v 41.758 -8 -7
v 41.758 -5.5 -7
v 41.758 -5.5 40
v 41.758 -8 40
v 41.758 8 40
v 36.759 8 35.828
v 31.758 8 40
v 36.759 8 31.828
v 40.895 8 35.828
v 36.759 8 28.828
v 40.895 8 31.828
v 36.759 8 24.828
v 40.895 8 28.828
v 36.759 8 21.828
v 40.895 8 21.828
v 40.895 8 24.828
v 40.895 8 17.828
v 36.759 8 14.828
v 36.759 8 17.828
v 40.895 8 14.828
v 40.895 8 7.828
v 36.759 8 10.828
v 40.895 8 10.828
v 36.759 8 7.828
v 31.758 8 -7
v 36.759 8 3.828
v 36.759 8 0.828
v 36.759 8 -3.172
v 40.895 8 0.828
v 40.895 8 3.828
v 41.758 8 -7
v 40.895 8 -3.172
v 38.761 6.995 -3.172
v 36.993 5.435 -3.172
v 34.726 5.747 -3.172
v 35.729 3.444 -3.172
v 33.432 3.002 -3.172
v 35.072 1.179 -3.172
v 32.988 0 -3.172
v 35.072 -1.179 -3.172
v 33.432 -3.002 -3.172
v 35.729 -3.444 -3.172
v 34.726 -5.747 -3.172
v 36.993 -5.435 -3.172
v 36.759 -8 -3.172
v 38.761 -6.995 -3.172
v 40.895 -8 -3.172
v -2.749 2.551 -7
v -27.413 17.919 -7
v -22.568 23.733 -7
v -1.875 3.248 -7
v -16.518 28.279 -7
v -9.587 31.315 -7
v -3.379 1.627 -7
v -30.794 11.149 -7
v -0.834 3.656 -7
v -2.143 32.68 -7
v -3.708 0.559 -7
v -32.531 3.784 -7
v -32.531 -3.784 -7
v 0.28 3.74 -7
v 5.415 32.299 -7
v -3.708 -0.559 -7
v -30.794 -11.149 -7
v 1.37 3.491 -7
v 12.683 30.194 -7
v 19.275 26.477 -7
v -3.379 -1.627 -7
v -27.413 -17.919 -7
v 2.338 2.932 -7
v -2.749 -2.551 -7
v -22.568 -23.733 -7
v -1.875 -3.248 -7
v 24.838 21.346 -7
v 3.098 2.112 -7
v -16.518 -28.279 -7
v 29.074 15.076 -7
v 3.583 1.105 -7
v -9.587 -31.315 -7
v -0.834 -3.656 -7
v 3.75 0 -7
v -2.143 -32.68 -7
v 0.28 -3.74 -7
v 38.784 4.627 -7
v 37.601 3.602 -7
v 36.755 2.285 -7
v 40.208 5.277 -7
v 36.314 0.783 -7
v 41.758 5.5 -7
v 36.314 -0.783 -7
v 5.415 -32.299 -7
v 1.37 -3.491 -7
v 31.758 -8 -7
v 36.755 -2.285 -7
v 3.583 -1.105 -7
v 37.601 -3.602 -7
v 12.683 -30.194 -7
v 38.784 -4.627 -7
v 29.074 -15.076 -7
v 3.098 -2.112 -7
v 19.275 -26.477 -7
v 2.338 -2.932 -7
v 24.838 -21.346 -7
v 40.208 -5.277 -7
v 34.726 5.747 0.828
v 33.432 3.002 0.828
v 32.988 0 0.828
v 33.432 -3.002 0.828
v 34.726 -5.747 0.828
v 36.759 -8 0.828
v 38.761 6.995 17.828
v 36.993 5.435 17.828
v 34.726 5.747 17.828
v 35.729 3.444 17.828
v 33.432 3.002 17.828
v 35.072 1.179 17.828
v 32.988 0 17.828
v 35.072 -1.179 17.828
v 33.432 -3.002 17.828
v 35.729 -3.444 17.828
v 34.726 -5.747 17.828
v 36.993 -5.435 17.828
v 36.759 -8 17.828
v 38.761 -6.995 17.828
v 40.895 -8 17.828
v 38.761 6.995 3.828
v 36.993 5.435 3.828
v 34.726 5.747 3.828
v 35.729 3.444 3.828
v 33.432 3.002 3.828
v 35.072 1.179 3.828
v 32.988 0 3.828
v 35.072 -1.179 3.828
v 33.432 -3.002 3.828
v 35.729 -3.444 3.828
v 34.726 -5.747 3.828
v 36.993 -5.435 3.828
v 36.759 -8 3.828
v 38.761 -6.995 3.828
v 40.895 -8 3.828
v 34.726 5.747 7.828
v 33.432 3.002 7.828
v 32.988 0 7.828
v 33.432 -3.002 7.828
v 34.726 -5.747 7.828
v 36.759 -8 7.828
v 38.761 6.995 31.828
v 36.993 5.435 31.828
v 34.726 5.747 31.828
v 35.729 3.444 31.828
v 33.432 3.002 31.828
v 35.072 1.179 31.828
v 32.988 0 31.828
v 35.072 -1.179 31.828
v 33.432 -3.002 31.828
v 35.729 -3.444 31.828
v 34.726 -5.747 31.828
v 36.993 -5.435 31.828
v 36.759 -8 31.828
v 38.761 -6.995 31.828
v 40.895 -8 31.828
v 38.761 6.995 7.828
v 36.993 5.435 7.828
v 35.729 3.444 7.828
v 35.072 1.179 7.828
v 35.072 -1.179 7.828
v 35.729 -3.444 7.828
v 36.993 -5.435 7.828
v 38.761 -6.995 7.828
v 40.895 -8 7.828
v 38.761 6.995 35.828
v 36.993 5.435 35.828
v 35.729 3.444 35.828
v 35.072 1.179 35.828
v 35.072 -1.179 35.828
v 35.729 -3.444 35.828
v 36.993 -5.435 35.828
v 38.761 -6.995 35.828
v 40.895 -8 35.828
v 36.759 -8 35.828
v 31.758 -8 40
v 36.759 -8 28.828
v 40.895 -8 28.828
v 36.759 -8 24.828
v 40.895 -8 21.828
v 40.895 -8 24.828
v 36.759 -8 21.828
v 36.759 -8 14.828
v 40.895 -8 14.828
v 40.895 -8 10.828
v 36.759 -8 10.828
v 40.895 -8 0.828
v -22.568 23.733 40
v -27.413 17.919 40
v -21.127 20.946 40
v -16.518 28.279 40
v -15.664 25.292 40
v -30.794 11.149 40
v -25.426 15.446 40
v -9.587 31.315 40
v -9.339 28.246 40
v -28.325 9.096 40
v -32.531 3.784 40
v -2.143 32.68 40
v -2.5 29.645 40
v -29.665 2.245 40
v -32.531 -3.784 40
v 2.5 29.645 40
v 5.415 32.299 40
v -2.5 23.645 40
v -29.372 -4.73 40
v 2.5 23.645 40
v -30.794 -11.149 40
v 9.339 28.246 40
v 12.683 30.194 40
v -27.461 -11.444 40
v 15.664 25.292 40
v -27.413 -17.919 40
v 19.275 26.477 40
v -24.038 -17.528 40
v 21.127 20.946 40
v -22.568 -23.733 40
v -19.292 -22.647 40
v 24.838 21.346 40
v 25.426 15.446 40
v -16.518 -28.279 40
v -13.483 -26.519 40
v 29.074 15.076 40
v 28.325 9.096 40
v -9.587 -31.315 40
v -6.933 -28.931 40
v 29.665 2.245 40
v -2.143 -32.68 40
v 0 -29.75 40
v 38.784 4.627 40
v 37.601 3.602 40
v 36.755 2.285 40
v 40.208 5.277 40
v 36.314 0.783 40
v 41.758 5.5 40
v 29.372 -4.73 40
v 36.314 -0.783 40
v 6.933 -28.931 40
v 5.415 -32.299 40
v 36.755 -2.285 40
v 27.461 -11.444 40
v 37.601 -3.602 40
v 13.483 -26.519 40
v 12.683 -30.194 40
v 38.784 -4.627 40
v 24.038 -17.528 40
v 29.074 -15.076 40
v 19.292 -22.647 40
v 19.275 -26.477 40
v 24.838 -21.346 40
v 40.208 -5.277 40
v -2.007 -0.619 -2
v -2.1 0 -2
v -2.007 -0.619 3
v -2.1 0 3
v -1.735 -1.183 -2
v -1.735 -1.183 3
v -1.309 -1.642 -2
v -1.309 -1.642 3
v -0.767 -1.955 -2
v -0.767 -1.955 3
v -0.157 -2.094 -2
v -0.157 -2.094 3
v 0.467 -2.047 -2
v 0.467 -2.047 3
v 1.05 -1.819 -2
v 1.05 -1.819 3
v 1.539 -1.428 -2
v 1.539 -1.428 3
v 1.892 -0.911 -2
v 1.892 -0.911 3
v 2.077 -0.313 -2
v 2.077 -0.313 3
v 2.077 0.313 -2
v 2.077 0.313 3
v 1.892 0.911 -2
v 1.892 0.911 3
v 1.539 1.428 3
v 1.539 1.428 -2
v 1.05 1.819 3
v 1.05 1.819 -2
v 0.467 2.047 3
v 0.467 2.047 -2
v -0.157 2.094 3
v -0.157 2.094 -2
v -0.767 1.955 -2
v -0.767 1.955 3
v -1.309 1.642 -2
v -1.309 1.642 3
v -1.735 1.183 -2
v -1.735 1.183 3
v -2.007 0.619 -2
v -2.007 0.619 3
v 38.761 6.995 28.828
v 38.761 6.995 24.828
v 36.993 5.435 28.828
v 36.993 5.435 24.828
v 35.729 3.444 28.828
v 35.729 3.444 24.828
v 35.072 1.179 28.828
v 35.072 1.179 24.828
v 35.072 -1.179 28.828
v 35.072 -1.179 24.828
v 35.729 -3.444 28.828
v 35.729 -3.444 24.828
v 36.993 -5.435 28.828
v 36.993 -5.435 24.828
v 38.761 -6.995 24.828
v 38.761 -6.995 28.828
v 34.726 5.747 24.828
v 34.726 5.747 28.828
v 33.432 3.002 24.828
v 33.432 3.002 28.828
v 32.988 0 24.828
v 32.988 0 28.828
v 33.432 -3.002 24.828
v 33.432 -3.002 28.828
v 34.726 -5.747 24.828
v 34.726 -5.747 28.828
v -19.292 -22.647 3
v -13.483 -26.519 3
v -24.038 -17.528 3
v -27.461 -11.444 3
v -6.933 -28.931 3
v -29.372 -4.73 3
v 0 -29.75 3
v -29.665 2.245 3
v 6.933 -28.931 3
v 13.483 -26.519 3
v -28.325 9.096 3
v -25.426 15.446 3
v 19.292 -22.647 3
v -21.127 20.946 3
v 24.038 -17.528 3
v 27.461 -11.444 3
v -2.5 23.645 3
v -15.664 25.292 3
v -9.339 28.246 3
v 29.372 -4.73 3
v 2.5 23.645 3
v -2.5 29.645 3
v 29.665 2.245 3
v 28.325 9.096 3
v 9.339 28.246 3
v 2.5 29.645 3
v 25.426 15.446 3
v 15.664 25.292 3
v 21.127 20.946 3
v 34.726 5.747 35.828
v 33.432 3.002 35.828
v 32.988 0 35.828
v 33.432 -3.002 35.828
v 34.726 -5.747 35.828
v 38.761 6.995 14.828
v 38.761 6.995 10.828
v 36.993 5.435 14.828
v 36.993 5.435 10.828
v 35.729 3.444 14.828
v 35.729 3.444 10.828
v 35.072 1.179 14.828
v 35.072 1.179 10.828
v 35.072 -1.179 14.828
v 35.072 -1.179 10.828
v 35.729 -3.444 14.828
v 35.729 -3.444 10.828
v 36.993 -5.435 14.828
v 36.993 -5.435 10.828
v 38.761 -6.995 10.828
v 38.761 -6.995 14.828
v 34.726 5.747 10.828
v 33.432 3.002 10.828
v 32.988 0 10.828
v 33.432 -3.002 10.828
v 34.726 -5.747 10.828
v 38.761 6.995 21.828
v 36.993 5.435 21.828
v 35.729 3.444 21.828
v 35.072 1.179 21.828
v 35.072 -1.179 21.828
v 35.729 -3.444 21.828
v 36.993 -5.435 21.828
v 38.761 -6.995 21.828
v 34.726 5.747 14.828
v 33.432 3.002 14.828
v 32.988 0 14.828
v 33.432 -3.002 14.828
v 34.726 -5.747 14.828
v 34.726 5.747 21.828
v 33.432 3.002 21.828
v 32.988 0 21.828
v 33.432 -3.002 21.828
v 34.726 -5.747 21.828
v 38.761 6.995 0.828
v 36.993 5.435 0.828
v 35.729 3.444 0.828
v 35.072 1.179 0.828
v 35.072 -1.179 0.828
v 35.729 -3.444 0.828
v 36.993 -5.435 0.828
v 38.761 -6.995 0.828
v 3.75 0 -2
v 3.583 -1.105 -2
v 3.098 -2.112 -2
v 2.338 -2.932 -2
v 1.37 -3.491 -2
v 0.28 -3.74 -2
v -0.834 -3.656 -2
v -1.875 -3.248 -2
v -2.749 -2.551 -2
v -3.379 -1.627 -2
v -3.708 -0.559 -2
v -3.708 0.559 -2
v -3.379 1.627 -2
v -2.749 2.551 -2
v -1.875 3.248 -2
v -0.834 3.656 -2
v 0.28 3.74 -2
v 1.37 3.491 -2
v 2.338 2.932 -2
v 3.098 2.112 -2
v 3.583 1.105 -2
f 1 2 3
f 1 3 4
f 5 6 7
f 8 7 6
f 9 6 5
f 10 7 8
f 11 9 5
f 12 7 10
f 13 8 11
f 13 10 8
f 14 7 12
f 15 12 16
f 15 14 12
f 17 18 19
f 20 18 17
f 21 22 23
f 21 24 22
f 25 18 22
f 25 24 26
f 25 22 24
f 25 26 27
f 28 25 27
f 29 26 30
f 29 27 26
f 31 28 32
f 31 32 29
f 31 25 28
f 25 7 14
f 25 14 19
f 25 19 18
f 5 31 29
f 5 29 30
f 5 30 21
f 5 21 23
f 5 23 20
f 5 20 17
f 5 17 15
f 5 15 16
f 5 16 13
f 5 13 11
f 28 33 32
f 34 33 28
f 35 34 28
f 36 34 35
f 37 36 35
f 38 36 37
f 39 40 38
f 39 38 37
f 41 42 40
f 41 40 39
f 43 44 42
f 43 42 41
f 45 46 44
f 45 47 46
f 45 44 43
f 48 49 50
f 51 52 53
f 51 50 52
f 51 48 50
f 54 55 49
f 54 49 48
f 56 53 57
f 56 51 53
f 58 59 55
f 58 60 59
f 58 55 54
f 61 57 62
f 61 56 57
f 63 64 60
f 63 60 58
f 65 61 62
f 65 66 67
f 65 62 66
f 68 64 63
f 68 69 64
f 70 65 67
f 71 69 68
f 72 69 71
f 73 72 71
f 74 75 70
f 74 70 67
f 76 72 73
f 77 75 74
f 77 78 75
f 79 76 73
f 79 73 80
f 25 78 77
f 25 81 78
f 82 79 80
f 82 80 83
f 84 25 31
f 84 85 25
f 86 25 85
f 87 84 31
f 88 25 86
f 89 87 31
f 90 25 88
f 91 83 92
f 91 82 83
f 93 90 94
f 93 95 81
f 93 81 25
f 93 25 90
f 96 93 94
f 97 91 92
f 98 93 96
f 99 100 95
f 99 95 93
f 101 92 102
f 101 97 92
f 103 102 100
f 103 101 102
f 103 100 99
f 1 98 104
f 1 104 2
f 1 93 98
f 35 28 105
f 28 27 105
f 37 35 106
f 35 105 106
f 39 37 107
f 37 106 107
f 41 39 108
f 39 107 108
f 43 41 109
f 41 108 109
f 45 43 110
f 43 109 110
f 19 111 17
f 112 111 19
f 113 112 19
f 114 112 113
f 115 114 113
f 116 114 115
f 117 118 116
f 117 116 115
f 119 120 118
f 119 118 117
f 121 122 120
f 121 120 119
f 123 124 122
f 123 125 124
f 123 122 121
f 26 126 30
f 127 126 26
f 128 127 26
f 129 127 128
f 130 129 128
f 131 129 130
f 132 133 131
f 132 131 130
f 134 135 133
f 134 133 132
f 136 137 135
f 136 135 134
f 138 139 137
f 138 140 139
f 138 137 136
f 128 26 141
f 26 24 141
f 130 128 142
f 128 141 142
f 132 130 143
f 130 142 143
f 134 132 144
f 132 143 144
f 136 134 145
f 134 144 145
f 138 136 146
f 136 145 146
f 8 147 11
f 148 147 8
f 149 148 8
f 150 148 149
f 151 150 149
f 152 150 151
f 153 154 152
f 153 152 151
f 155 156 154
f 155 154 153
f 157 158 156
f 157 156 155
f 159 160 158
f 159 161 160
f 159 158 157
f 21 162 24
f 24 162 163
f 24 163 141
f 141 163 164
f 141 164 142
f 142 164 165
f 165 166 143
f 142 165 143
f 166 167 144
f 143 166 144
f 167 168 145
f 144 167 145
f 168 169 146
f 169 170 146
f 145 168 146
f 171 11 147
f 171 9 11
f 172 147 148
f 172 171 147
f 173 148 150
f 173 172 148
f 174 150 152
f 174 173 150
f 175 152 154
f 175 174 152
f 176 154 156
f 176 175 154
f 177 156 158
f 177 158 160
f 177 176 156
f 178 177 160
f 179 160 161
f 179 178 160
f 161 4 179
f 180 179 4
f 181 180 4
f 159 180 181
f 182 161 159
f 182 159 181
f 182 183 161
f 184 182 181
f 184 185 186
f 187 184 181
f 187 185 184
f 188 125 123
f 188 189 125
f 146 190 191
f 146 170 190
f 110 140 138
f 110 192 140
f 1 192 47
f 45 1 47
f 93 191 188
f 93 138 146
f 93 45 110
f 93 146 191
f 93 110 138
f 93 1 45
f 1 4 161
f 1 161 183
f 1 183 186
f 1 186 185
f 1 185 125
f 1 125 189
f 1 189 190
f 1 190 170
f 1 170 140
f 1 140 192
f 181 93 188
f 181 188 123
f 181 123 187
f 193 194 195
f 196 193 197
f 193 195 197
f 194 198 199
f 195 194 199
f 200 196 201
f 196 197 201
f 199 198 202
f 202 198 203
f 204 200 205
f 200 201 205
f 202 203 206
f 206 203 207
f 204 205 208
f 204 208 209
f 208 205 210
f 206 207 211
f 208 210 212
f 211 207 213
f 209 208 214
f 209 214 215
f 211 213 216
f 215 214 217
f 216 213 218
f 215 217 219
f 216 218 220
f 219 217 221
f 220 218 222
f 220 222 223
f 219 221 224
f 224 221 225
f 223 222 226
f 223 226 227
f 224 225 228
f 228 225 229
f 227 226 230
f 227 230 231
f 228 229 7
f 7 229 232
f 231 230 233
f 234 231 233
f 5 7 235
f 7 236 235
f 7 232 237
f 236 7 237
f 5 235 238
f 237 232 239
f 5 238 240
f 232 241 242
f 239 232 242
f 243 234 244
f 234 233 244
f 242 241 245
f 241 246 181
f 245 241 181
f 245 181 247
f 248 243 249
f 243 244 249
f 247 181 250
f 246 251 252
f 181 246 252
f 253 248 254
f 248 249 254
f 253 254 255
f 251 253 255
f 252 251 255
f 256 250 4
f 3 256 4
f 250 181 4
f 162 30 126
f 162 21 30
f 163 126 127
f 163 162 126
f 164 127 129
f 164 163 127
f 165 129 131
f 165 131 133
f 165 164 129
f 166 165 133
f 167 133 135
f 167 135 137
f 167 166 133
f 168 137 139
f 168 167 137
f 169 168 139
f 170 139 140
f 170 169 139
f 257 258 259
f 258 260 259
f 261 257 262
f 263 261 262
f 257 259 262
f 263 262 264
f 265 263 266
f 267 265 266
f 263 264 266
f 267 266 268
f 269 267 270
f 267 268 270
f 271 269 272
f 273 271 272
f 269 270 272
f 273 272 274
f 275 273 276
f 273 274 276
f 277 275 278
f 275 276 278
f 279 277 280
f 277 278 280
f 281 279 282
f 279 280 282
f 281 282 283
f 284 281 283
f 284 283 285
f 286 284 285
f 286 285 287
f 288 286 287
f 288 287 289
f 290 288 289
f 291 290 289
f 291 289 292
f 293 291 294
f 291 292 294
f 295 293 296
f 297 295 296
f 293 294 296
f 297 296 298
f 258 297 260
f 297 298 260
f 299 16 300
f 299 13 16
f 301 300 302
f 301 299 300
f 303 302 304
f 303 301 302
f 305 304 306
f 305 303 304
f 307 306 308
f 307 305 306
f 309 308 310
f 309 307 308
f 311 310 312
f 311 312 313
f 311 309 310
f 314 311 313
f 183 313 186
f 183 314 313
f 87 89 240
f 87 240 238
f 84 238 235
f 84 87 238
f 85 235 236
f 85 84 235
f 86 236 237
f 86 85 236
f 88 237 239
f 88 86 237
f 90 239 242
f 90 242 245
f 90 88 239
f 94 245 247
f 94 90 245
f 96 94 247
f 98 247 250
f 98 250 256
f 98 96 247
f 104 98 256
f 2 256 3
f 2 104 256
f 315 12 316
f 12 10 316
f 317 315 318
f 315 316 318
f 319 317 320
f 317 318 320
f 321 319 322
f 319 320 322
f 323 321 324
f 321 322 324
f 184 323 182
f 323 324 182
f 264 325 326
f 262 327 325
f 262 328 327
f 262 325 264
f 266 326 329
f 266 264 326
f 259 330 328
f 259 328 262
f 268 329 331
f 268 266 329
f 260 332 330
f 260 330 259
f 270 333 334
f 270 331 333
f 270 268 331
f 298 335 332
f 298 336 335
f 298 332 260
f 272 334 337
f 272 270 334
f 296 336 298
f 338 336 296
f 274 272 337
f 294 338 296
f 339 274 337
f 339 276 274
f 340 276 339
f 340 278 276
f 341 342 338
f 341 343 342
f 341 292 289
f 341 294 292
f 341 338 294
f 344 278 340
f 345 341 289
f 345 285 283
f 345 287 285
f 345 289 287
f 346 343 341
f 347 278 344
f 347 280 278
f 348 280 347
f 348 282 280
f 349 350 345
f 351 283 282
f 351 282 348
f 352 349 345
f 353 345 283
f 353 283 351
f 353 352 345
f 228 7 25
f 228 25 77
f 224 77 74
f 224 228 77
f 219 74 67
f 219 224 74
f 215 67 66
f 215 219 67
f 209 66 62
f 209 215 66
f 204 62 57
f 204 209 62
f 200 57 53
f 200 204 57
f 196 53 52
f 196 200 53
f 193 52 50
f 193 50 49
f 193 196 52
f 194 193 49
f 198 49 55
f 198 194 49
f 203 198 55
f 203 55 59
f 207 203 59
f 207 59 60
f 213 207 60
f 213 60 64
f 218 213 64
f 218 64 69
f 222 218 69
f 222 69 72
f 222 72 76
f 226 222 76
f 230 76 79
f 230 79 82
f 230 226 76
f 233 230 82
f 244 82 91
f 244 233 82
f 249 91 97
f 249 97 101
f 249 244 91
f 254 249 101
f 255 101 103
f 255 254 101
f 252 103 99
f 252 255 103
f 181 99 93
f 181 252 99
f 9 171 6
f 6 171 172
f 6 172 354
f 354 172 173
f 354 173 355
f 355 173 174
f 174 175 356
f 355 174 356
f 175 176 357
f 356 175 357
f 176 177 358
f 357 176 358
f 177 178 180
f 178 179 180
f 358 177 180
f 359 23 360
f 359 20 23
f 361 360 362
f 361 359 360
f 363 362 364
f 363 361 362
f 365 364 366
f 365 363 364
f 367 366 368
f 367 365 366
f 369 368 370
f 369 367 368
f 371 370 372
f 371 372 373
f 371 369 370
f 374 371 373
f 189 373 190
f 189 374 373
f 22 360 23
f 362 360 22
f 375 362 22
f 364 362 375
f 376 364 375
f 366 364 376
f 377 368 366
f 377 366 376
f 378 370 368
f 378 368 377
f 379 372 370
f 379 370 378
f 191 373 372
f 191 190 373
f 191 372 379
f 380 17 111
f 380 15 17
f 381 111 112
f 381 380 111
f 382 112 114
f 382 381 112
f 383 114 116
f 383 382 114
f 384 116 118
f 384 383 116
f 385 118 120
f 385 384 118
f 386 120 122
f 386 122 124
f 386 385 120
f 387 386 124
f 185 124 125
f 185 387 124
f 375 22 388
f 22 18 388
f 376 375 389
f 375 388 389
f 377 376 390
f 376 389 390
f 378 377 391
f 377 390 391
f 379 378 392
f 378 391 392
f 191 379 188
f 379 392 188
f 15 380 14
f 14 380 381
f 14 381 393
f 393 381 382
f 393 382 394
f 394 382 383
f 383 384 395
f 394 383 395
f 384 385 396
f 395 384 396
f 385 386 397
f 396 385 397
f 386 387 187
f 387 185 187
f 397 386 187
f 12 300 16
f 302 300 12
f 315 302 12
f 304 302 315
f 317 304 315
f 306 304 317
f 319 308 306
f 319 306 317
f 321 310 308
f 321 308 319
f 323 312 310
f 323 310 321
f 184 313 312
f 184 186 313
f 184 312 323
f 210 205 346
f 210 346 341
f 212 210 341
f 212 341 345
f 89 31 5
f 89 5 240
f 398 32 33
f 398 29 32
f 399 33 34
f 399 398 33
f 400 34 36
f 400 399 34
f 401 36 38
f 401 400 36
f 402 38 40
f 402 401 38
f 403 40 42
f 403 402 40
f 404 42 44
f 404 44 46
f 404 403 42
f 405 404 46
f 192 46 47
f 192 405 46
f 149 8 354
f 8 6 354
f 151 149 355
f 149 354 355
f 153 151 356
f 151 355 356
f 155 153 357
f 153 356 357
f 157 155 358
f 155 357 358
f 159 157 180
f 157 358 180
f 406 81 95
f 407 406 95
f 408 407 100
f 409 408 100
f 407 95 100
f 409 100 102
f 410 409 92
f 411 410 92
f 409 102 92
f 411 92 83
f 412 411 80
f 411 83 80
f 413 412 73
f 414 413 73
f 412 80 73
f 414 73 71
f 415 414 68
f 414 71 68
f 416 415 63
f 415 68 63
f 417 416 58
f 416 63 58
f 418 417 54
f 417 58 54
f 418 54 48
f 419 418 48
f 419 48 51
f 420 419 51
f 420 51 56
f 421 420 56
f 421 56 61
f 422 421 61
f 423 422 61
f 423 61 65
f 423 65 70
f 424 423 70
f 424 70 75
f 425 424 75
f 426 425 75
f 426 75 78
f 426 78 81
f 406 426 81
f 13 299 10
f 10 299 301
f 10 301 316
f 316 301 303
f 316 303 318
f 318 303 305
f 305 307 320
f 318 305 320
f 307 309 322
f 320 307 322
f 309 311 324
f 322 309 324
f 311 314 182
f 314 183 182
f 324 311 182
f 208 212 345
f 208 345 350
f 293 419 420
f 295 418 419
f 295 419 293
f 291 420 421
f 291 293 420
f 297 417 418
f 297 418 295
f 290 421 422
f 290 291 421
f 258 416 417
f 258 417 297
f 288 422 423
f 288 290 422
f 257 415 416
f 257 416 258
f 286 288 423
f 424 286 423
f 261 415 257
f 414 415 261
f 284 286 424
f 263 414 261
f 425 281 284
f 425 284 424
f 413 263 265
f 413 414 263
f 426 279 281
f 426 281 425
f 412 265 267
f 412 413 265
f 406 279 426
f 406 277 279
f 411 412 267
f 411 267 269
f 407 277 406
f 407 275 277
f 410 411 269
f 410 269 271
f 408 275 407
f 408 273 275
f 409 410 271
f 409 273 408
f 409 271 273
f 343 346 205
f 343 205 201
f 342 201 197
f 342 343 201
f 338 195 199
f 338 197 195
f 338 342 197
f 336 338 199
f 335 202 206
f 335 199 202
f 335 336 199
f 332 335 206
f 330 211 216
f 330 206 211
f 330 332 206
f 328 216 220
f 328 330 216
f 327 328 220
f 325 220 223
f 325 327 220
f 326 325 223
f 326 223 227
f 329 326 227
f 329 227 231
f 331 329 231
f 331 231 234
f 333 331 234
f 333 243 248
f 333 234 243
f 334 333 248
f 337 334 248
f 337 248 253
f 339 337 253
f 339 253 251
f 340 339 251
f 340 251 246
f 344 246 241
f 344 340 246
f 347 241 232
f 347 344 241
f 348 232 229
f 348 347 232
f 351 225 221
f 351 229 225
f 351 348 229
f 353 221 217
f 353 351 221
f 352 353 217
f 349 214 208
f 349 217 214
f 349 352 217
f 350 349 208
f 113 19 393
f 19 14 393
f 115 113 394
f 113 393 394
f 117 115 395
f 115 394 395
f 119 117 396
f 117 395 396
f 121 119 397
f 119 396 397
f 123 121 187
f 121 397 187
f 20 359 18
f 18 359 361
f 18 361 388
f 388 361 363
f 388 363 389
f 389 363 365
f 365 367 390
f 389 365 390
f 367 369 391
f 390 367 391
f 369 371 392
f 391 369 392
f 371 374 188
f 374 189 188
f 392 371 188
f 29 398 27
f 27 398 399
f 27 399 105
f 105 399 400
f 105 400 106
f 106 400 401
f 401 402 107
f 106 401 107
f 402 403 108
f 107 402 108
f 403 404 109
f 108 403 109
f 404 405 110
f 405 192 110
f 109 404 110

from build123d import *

# Parameters (mm, degrees)
F0_R           = 32.75
F1_DEPTH       = 40
F2_T           = -3
F3_DEPTH       = 7
F5_D           = 4.2
F5_DEPTH       = 15
F5_CBORE_D     = 7.5
F5_CBORE_DEPTH = 5
F5_TIP         = 1.2618073
F7_DEPTH       = 37
F9_DEPTH       = 47
F10_W          = 2
F10_H          = 4


with BuildPart() as f1:
    # F0 (on Top) → F1 (new body)
    with BuildSketch(Plane.XY):
        Circle(F0_R)
    extrude(amount=F1_DEPTH)

    # F2
    f2_openings = [f1.faces().sort_by_distance(p)[0] for p in [
        (0, 0, 40),
    ]]
    offset(amount=F2_T, openings=f2_openings)

    # F3 (add): a face of the model
    f3_faces = [f1.faces().sort_by_distance(p)[0] for p in [
        (0, 0, 0),
    ]]
    extrude(f3_faces, amount=F3_DEPTH)

    # F5
    with Locations(Plane(origin=(0, 0, -7), x_dir=(1, 0, 0), z_dir=(0, 0, -1))):
        with Locations((0, 0)):
            CounterBoreHole(F5_D / 2, F5_CBORE_D / 2, F5_CBORE_DEPTH, depth=F5_DEPTH)
            with Locations((0, 0, -(F5_DEPTH + F5_TIP / 2))):  # 118° drill point
                Cone(0, F5_D / 2, F5_TIP, mode=Mode.SUBTRACT)

    # F6 (on face) → F7 (join)
    with BuildSketch(Plane.XY.offset(3)):
        with BuildLine():
            ThreePointArc((2.5, 29.6447718831), (0, 29.75), (-2.5, 29.6447718831))
            Line((-2.5, 29.6447718831), (-2.5, 23.6447718831))
            Line((-2.5, 23.6447718831), (2.5, 23.6447718831))
            Line((2.5, 23.6447718831), (2.5, 29.6447718831))
        make_face()
    extrude(amount=F7_DEPTH)

    # F8 (on face) → F9 (join)
    with BuildSketch(Plane(origin=(0, 0, -7), x_dir=(1, 0, 0), z_dir=(0, 0, -1))):
        with BuildLine():
            ThreePointArc((32.75, 0), (32.5010218458, -4.0306425017), (31.7578730396, -8))
            Line((31.7578730396, -8), (41.7578730396, -8))
            Line((41.7578730396, -8), (41.7578730396, -5.5))
            ThreePointArc((41.7578730396, -5.5), (36.2578730396, 0), (41.7578730396, 5.5))
            Line((41.7578730396, 5.5), (41.7578730396, 8))
            Line((41.7578730396, 8), (31.7578730396, 8))
            ThreePointArc((31.7578730396, 8), (32.5010218458, 4.0306425017), (32.75, 0))
        make_face()
    extrude(amount=-F9_DEPTH)

    # F10 (on Front) → F11 (revolve, cut)
    with BuildSketch(Plane.XZ):
        with Locations((33.9883454144, -1.1719100263)):
            Rectangle(F10_W, F10_H)
        with Locations((33.9883454144, 5.8280899737)):
            Rectangle(F10_W, F10_H)
        with Locations((33.9883454144, 12.8280899737)):
            Rectangle(F10_W, F10_H)
        with Locations((33.9883454144, 19.8280899737)):
            Rectangle(F10_W, F10_H)
        with Locations((33.9883454144, 26.8280899737)):
            Rectangle(F10_W, F10_H)
        with Locations((33.9883454144, 33.8280899737)):
            Rectangle(F10_W, F10_H)
    revolve(axis=Axis((43.3594956994, 0, 17.8845692426), (0, 0, 1)), mode=Mode.SUBTRACT)


solid = f1.part
